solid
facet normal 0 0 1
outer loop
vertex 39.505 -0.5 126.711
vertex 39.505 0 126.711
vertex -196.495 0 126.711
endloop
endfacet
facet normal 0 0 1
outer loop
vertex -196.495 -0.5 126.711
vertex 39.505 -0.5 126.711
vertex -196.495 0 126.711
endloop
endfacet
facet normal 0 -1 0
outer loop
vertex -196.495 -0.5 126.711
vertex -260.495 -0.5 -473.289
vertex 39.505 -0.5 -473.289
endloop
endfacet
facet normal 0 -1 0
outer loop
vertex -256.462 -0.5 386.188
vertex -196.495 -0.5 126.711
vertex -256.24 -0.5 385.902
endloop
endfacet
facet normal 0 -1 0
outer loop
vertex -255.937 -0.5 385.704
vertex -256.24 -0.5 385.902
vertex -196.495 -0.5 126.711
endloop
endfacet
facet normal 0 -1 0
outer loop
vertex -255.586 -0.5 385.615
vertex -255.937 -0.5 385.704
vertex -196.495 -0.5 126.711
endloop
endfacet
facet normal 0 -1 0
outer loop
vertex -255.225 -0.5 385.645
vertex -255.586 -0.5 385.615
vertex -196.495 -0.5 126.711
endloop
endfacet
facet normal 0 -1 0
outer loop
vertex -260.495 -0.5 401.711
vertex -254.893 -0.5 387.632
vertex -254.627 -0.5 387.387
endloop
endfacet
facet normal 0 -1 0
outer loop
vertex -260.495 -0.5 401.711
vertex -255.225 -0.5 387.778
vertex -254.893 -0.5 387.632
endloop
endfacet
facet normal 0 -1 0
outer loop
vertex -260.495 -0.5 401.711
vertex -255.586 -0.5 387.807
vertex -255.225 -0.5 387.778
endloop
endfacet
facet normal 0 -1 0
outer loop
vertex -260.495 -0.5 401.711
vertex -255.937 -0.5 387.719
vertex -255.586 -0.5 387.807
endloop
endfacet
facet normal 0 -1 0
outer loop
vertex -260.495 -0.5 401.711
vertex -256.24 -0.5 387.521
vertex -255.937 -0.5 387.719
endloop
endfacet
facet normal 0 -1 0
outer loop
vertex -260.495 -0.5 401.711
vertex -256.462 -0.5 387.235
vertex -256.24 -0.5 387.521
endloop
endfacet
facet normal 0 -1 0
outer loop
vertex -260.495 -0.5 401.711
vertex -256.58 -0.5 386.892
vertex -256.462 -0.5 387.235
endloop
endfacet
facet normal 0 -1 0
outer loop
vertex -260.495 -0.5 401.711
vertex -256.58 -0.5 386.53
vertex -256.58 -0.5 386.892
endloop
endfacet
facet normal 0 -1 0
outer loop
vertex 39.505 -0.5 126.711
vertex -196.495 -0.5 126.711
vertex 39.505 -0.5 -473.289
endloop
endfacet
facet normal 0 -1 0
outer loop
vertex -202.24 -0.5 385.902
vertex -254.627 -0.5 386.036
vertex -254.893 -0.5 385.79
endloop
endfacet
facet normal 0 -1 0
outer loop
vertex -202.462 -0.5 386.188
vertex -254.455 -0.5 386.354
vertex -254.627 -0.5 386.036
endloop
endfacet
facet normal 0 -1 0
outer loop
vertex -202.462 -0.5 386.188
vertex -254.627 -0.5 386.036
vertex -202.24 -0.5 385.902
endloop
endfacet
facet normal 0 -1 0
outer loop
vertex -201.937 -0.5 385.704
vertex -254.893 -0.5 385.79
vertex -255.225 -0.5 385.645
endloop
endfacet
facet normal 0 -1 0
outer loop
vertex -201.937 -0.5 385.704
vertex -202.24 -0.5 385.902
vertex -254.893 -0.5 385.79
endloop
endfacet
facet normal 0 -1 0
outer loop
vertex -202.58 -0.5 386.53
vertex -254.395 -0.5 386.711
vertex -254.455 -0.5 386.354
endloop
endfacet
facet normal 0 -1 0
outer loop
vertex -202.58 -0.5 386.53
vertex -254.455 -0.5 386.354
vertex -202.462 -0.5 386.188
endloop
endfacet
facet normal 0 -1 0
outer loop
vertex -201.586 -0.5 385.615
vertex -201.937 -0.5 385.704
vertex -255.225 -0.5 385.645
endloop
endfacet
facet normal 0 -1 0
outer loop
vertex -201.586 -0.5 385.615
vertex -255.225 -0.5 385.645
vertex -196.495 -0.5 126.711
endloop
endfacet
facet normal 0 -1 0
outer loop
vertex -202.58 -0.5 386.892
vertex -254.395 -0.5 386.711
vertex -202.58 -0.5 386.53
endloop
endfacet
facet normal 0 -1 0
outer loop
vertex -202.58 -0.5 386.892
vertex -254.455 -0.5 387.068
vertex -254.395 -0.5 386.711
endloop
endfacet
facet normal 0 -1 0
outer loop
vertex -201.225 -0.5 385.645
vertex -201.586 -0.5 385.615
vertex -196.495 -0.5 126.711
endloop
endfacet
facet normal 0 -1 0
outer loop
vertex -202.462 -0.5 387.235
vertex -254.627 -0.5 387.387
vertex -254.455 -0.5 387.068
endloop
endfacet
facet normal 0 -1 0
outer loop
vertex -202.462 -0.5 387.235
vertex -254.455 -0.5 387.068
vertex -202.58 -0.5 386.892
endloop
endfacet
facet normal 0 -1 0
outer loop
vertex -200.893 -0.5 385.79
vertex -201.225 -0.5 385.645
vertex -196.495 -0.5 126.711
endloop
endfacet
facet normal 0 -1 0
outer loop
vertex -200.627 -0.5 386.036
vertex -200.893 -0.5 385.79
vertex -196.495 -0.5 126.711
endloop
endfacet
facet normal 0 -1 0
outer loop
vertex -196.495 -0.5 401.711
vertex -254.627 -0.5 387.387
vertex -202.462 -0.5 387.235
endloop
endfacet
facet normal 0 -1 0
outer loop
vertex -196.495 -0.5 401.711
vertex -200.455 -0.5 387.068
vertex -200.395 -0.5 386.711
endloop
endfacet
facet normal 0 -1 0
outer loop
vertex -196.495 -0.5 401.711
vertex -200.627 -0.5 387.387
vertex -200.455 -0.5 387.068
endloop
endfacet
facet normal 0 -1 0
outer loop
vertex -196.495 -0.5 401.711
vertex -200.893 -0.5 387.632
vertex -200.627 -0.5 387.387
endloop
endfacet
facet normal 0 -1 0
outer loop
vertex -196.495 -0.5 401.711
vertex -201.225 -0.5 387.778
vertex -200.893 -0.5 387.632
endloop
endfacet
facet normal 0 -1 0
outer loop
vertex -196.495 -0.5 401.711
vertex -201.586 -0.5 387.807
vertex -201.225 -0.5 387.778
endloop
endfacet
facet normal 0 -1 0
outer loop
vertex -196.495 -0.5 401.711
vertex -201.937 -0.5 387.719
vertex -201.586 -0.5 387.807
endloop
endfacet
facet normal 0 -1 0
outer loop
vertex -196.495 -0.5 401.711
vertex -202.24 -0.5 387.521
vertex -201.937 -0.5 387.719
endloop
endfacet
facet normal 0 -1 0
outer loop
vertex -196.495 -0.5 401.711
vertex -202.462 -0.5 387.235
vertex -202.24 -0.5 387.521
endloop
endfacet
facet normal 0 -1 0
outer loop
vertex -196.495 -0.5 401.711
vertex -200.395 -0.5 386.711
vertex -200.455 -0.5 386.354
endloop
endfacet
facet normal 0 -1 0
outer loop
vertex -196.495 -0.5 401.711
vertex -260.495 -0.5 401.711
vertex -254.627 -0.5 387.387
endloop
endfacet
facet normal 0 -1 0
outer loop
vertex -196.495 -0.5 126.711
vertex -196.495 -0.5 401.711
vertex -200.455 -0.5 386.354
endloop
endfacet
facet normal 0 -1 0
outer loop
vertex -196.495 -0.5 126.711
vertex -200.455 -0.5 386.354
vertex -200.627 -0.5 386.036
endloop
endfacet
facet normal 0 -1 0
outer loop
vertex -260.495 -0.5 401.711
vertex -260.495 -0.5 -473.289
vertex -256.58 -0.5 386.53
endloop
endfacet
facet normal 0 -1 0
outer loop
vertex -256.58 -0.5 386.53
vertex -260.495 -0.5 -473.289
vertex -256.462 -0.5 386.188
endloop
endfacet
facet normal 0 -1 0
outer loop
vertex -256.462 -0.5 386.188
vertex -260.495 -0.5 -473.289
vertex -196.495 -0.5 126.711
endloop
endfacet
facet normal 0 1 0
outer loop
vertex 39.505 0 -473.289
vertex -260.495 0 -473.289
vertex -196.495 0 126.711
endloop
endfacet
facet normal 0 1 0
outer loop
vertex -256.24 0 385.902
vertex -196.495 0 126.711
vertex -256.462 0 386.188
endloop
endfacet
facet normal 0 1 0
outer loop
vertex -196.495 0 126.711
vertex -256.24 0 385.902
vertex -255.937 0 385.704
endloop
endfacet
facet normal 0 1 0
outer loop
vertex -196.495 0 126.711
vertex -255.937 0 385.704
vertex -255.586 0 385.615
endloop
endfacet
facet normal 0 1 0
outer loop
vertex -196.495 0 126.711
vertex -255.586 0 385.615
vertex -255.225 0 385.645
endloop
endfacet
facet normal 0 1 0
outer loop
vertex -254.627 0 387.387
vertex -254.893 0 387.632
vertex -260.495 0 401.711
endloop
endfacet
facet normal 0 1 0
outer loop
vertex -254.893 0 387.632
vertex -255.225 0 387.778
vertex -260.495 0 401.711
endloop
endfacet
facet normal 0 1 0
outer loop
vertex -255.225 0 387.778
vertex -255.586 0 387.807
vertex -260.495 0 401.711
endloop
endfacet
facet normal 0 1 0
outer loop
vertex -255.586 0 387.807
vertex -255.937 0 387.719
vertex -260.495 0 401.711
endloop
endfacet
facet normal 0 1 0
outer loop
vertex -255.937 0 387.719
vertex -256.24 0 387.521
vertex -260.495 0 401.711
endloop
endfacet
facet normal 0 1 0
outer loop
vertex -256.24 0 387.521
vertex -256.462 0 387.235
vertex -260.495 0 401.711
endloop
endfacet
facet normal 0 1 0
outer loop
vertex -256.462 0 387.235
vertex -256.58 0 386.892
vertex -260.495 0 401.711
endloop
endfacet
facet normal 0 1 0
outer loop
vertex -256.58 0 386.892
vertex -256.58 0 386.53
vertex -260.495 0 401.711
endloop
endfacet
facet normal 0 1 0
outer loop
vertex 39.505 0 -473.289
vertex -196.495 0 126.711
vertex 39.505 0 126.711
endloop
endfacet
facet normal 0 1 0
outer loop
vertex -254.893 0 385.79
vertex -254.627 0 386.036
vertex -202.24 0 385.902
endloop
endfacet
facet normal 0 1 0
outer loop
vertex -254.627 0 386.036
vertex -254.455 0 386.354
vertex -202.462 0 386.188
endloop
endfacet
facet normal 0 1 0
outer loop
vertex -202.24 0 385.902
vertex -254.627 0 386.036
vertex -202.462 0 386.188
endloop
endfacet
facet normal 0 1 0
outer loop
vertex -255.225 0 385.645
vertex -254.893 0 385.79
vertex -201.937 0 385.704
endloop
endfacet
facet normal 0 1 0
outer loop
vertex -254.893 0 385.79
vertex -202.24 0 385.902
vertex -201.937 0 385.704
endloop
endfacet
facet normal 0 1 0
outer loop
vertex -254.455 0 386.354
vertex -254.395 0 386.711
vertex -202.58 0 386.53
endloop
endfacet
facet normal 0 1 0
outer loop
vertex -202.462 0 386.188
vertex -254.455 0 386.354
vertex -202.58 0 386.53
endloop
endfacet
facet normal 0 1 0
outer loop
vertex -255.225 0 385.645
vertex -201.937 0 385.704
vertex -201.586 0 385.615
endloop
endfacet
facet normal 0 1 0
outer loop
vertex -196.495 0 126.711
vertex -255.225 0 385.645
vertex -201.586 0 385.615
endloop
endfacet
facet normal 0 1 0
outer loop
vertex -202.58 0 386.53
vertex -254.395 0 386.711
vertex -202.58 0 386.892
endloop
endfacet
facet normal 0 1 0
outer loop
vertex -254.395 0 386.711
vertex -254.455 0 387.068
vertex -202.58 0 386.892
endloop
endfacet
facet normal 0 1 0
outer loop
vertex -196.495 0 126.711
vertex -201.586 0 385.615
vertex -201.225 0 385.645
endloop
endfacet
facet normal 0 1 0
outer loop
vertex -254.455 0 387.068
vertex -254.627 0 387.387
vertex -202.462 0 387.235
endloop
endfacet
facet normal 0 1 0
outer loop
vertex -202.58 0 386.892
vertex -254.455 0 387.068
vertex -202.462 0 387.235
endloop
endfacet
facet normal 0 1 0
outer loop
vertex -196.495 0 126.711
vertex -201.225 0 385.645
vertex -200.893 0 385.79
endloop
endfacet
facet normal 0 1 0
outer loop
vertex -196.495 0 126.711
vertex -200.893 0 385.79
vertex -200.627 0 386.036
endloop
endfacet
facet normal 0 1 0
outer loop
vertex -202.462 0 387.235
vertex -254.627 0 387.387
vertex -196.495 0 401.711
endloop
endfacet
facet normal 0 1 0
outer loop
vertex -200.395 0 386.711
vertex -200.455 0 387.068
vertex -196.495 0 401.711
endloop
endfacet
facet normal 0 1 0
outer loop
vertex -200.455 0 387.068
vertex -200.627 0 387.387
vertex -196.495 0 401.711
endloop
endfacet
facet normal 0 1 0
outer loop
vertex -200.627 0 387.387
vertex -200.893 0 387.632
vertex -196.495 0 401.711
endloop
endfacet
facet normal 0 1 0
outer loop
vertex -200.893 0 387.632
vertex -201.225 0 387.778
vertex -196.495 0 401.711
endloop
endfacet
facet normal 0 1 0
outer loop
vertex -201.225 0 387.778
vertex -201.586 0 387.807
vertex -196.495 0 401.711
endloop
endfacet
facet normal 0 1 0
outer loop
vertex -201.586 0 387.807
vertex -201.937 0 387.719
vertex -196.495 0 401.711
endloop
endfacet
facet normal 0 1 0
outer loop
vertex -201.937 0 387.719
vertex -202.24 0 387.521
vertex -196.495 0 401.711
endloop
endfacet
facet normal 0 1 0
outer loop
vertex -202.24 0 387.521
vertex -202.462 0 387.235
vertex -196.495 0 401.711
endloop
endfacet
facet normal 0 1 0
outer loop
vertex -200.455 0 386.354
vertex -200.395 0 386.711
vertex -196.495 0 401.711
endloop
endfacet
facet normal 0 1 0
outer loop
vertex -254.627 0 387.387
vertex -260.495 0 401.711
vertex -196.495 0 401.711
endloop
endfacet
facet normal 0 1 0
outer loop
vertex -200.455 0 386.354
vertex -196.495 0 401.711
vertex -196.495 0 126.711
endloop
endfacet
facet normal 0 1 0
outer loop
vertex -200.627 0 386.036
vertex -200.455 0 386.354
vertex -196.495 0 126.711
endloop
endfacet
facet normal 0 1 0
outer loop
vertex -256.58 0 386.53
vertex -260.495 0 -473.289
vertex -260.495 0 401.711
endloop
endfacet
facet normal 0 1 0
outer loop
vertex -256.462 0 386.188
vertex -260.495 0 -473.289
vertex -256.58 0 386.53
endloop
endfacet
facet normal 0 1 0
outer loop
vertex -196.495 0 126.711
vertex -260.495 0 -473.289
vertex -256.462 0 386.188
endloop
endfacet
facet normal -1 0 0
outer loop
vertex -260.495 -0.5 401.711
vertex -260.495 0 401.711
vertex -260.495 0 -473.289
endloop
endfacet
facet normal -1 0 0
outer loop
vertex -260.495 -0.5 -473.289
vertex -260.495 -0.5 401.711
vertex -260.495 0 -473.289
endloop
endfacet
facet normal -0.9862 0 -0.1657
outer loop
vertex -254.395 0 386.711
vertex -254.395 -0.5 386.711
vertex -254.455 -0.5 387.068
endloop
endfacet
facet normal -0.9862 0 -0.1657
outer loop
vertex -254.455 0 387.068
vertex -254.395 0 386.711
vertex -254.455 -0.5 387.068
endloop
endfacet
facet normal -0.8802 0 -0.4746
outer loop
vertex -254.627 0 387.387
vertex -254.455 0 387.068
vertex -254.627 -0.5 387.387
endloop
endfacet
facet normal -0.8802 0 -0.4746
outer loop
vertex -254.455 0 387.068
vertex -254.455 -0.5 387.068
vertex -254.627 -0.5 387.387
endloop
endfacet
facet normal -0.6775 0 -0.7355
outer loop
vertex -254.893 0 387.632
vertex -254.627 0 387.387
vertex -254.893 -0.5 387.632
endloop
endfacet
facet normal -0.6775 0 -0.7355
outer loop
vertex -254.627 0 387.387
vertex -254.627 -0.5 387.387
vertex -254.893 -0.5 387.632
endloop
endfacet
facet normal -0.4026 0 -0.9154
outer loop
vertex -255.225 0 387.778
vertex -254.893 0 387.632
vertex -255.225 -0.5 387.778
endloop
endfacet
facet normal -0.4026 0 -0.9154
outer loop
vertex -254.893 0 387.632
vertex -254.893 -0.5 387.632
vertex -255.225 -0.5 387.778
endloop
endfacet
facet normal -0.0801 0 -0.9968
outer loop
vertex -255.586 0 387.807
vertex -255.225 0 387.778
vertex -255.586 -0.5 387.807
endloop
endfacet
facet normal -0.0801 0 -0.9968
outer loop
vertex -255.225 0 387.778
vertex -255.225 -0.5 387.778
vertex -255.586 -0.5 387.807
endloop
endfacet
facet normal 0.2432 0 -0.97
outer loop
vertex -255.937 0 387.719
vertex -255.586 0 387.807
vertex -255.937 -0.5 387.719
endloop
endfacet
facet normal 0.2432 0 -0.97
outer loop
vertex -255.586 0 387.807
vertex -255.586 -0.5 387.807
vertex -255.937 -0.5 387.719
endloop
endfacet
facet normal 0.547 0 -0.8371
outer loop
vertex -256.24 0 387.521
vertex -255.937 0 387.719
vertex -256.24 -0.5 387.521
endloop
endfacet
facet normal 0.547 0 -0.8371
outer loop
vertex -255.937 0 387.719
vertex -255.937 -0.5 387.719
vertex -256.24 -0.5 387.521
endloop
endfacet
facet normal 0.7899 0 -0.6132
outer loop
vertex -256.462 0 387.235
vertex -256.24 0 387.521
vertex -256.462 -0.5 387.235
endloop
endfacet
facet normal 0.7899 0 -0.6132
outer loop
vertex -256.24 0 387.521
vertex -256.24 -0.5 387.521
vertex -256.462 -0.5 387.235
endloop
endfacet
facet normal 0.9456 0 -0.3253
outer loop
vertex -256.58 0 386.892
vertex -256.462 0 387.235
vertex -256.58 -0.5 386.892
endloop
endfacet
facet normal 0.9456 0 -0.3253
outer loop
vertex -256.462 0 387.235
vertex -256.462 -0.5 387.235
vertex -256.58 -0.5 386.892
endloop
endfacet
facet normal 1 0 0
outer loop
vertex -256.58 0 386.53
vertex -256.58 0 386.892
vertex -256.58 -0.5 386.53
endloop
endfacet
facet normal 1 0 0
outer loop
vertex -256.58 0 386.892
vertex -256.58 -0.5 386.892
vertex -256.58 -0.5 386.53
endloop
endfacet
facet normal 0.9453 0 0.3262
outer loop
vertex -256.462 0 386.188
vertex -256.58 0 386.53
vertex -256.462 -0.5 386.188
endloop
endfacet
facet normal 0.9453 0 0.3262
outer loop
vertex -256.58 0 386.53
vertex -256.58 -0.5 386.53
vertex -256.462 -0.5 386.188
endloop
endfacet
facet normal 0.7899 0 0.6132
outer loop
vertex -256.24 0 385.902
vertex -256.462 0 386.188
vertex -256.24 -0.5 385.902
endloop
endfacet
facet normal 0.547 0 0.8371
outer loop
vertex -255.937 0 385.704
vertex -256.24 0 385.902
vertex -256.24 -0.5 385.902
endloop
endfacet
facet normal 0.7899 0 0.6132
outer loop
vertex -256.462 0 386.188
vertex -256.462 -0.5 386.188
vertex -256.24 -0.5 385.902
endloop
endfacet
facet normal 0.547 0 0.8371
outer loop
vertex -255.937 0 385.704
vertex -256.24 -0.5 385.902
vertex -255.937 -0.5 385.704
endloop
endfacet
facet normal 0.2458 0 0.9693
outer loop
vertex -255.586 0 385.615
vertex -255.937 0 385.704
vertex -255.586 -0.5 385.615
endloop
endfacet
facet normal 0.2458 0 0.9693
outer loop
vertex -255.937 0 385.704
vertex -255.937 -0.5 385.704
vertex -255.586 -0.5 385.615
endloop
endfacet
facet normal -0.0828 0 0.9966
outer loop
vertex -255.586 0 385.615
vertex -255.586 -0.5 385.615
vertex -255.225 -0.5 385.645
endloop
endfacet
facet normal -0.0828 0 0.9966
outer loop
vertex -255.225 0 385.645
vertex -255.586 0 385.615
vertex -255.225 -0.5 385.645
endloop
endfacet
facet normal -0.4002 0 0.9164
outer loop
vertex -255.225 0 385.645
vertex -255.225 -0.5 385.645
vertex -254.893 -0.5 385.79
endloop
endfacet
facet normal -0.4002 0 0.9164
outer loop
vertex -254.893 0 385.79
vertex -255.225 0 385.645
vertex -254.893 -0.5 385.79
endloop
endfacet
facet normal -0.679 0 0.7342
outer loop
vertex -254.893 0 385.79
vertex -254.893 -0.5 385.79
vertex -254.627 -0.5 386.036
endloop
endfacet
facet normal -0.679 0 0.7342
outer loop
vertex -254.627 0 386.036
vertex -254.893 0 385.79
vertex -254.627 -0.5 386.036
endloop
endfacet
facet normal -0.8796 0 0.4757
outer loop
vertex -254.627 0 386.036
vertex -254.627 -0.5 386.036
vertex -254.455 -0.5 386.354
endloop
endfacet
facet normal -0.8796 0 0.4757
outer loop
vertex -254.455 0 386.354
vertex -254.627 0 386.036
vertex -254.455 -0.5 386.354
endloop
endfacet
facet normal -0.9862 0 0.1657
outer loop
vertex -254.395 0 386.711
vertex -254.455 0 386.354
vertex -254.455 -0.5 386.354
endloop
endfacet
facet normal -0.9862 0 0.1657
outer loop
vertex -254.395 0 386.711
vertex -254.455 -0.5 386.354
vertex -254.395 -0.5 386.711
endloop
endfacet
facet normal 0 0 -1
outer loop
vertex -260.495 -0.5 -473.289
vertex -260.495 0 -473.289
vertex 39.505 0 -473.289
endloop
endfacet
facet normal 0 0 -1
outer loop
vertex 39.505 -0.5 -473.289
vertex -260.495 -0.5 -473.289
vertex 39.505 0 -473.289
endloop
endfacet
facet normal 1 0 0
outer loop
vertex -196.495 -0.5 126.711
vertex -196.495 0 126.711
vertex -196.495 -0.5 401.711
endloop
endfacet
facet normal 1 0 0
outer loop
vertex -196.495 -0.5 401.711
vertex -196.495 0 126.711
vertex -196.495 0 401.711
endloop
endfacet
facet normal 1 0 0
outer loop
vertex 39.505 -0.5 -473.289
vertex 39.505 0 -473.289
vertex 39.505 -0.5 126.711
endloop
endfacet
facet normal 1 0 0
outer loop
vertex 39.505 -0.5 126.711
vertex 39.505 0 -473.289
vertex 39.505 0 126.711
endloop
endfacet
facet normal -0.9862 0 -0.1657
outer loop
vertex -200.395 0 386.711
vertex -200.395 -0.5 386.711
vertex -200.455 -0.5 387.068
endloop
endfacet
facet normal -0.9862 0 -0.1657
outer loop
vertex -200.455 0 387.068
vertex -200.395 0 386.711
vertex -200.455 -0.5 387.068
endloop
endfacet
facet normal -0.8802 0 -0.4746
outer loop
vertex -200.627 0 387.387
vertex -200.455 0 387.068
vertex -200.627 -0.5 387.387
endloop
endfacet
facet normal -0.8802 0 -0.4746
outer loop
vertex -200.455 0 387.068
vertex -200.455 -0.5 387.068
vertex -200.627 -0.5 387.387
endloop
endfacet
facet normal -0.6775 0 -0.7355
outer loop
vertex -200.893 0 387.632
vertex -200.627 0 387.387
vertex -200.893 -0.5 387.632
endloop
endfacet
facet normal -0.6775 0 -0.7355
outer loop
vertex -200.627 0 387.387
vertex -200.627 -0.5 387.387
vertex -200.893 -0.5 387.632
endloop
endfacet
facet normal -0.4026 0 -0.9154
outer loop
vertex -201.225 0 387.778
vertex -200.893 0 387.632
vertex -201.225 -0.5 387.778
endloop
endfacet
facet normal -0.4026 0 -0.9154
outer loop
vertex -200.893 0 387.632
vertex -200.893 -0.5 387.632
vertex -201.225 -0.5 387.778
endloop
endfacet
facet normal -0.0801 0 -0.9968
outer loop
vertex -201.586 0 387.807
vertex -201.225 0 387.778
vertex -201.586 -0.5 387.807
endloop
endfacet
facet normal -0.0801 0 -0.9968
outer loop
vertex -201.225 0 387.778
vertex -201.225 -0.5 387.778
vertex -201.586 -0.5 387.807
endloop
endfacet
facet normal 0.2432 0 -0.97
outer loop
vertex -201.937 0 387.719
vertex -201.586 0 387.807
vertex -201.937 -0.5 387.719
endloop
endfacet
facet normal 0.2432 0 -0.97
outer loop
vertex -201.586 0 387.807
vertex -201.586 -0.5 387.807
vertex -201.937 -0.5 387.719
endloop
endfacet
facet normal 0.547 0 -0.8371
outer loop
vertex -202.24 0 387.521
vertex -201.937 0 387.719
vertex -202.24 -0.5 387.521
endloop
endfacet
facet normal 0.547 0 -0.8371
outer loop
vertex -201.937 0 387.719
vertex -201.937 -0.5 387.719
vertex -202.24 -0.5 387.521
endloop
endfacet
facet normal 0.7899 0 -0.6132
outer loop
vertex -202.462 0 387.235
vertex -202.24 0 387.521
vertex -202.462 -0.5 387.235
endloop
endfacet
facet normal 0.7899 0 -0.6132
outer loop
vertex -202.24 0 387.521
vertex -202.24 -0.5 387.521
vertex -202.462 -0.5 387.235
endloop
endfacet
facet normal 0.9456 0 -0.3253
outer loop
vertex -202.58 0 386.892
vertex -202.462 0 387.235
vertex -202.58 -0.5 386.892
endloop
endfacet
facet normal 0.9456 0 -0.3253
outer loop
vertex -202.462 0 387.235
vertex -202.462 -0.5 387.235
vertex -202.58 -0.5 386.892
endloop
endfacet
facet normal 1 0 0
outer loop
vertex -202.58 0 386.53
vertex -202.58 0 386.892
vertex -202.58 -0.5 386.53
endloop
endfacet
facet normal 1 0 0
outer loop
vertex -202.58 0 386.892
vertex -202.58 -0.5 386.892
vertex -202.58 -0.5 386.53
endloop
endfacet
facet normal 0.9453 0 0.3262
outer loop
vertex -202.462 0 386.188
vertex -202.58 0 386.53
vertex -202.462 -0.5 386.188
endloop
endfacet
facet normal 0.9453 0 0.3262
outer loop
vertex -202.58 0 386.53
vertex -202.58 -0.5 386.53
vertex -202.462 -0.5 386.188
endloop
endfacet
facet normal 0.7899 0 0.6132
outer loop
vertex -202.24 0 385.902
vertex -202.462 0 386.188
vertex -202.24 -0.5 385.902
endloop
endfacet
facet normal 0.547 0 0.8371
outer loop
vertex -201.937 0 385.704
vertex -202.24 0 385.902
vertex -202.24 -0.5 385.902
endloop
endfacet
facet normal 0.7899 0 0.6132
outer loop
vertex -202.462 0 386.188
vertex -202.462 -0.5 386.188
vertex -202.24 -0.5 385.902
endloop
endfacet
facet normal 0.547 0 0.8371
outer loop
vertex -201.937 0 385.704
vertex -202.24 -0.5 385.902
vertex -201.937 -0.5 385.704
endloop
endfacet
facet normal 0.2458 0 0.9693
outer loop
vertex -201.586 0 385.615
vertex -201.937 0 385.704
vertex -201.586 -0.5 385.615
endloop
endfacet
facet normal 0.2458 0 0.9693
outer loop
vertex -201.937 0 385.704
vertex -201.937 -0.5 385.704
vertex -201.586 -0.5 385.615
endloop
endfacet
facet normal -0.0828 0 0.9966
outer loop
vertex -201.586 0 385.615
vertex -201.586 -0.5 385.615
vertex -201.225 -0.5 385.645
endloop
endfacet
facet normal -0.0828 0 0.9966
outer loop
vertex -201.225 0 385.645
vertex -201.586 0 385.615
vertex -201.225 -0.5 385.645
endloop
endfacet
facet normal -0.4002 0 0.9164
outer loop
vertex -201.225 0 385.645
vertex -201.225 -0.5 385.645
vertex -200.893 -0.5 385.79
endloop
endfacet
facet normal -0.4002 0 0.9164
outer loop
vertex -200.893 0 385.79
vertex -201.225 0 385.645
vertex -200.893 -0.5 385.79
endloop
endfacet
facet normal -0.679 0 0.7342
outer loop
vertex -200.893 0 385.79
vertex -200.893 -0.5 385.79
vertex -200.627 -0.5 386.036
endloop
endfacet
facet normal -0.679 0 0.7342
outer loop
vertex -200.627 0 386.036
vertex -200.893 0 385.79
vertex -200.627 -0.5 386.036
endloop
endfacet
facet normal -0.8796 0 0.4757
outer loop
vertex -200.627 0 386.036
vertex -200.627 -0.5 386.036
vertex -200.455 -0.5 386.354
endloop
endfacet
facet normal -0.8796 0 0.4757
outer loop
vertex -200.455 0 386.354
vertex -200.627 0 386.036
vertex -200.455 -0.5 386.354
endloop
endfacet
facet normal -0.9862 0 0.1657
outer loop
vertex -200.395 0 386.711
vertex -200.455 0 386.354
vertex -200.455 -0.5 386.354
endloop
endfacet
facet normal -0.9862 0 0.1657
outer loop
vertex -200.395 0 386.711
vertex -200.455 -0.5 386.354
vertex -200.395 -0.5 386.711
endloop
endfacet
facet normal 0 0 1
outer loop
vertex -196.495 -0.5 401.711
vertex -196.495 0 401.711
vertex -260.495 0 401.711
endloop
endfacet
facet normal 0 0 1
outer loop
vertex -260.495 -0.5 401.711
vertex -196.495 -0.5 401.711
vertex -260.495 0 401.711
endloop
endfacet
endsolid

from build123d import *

# Parameters (mm, degrees)
F1_DEPTH = 0.5
F2_R     = 1.1
F3_DEPTH = 0.501


with BuildPart() as f1:
    # F0 (on Front) → F1 (new body)
    with BuildSketch(Plane.XZ):
        Polygon((39.504941, 126.711226), (-196.495059, 126.711226), (-196.495059, 401.711226), (-260.495059, 401.711226), (-260.495059, 126.711226), (-260.495059, -473.288774), (39.504941, -473.288774), align=None)
    extrude(amount=F1_DEPTH)

    # F2 (on face) → F3 (cut, through all)
    with BuildSketch(Plane.XZ.offset(0.5)):
        with Locations((-255.495059, 386.711226)):
            Circle(F2_R)
        with Locations((-201.495059, 386.711226)):
            Circle(F2_R)
    extrude(amount=-F3_DEPTH, mode=Mode.SUBTRACT)


solid = f1.part
